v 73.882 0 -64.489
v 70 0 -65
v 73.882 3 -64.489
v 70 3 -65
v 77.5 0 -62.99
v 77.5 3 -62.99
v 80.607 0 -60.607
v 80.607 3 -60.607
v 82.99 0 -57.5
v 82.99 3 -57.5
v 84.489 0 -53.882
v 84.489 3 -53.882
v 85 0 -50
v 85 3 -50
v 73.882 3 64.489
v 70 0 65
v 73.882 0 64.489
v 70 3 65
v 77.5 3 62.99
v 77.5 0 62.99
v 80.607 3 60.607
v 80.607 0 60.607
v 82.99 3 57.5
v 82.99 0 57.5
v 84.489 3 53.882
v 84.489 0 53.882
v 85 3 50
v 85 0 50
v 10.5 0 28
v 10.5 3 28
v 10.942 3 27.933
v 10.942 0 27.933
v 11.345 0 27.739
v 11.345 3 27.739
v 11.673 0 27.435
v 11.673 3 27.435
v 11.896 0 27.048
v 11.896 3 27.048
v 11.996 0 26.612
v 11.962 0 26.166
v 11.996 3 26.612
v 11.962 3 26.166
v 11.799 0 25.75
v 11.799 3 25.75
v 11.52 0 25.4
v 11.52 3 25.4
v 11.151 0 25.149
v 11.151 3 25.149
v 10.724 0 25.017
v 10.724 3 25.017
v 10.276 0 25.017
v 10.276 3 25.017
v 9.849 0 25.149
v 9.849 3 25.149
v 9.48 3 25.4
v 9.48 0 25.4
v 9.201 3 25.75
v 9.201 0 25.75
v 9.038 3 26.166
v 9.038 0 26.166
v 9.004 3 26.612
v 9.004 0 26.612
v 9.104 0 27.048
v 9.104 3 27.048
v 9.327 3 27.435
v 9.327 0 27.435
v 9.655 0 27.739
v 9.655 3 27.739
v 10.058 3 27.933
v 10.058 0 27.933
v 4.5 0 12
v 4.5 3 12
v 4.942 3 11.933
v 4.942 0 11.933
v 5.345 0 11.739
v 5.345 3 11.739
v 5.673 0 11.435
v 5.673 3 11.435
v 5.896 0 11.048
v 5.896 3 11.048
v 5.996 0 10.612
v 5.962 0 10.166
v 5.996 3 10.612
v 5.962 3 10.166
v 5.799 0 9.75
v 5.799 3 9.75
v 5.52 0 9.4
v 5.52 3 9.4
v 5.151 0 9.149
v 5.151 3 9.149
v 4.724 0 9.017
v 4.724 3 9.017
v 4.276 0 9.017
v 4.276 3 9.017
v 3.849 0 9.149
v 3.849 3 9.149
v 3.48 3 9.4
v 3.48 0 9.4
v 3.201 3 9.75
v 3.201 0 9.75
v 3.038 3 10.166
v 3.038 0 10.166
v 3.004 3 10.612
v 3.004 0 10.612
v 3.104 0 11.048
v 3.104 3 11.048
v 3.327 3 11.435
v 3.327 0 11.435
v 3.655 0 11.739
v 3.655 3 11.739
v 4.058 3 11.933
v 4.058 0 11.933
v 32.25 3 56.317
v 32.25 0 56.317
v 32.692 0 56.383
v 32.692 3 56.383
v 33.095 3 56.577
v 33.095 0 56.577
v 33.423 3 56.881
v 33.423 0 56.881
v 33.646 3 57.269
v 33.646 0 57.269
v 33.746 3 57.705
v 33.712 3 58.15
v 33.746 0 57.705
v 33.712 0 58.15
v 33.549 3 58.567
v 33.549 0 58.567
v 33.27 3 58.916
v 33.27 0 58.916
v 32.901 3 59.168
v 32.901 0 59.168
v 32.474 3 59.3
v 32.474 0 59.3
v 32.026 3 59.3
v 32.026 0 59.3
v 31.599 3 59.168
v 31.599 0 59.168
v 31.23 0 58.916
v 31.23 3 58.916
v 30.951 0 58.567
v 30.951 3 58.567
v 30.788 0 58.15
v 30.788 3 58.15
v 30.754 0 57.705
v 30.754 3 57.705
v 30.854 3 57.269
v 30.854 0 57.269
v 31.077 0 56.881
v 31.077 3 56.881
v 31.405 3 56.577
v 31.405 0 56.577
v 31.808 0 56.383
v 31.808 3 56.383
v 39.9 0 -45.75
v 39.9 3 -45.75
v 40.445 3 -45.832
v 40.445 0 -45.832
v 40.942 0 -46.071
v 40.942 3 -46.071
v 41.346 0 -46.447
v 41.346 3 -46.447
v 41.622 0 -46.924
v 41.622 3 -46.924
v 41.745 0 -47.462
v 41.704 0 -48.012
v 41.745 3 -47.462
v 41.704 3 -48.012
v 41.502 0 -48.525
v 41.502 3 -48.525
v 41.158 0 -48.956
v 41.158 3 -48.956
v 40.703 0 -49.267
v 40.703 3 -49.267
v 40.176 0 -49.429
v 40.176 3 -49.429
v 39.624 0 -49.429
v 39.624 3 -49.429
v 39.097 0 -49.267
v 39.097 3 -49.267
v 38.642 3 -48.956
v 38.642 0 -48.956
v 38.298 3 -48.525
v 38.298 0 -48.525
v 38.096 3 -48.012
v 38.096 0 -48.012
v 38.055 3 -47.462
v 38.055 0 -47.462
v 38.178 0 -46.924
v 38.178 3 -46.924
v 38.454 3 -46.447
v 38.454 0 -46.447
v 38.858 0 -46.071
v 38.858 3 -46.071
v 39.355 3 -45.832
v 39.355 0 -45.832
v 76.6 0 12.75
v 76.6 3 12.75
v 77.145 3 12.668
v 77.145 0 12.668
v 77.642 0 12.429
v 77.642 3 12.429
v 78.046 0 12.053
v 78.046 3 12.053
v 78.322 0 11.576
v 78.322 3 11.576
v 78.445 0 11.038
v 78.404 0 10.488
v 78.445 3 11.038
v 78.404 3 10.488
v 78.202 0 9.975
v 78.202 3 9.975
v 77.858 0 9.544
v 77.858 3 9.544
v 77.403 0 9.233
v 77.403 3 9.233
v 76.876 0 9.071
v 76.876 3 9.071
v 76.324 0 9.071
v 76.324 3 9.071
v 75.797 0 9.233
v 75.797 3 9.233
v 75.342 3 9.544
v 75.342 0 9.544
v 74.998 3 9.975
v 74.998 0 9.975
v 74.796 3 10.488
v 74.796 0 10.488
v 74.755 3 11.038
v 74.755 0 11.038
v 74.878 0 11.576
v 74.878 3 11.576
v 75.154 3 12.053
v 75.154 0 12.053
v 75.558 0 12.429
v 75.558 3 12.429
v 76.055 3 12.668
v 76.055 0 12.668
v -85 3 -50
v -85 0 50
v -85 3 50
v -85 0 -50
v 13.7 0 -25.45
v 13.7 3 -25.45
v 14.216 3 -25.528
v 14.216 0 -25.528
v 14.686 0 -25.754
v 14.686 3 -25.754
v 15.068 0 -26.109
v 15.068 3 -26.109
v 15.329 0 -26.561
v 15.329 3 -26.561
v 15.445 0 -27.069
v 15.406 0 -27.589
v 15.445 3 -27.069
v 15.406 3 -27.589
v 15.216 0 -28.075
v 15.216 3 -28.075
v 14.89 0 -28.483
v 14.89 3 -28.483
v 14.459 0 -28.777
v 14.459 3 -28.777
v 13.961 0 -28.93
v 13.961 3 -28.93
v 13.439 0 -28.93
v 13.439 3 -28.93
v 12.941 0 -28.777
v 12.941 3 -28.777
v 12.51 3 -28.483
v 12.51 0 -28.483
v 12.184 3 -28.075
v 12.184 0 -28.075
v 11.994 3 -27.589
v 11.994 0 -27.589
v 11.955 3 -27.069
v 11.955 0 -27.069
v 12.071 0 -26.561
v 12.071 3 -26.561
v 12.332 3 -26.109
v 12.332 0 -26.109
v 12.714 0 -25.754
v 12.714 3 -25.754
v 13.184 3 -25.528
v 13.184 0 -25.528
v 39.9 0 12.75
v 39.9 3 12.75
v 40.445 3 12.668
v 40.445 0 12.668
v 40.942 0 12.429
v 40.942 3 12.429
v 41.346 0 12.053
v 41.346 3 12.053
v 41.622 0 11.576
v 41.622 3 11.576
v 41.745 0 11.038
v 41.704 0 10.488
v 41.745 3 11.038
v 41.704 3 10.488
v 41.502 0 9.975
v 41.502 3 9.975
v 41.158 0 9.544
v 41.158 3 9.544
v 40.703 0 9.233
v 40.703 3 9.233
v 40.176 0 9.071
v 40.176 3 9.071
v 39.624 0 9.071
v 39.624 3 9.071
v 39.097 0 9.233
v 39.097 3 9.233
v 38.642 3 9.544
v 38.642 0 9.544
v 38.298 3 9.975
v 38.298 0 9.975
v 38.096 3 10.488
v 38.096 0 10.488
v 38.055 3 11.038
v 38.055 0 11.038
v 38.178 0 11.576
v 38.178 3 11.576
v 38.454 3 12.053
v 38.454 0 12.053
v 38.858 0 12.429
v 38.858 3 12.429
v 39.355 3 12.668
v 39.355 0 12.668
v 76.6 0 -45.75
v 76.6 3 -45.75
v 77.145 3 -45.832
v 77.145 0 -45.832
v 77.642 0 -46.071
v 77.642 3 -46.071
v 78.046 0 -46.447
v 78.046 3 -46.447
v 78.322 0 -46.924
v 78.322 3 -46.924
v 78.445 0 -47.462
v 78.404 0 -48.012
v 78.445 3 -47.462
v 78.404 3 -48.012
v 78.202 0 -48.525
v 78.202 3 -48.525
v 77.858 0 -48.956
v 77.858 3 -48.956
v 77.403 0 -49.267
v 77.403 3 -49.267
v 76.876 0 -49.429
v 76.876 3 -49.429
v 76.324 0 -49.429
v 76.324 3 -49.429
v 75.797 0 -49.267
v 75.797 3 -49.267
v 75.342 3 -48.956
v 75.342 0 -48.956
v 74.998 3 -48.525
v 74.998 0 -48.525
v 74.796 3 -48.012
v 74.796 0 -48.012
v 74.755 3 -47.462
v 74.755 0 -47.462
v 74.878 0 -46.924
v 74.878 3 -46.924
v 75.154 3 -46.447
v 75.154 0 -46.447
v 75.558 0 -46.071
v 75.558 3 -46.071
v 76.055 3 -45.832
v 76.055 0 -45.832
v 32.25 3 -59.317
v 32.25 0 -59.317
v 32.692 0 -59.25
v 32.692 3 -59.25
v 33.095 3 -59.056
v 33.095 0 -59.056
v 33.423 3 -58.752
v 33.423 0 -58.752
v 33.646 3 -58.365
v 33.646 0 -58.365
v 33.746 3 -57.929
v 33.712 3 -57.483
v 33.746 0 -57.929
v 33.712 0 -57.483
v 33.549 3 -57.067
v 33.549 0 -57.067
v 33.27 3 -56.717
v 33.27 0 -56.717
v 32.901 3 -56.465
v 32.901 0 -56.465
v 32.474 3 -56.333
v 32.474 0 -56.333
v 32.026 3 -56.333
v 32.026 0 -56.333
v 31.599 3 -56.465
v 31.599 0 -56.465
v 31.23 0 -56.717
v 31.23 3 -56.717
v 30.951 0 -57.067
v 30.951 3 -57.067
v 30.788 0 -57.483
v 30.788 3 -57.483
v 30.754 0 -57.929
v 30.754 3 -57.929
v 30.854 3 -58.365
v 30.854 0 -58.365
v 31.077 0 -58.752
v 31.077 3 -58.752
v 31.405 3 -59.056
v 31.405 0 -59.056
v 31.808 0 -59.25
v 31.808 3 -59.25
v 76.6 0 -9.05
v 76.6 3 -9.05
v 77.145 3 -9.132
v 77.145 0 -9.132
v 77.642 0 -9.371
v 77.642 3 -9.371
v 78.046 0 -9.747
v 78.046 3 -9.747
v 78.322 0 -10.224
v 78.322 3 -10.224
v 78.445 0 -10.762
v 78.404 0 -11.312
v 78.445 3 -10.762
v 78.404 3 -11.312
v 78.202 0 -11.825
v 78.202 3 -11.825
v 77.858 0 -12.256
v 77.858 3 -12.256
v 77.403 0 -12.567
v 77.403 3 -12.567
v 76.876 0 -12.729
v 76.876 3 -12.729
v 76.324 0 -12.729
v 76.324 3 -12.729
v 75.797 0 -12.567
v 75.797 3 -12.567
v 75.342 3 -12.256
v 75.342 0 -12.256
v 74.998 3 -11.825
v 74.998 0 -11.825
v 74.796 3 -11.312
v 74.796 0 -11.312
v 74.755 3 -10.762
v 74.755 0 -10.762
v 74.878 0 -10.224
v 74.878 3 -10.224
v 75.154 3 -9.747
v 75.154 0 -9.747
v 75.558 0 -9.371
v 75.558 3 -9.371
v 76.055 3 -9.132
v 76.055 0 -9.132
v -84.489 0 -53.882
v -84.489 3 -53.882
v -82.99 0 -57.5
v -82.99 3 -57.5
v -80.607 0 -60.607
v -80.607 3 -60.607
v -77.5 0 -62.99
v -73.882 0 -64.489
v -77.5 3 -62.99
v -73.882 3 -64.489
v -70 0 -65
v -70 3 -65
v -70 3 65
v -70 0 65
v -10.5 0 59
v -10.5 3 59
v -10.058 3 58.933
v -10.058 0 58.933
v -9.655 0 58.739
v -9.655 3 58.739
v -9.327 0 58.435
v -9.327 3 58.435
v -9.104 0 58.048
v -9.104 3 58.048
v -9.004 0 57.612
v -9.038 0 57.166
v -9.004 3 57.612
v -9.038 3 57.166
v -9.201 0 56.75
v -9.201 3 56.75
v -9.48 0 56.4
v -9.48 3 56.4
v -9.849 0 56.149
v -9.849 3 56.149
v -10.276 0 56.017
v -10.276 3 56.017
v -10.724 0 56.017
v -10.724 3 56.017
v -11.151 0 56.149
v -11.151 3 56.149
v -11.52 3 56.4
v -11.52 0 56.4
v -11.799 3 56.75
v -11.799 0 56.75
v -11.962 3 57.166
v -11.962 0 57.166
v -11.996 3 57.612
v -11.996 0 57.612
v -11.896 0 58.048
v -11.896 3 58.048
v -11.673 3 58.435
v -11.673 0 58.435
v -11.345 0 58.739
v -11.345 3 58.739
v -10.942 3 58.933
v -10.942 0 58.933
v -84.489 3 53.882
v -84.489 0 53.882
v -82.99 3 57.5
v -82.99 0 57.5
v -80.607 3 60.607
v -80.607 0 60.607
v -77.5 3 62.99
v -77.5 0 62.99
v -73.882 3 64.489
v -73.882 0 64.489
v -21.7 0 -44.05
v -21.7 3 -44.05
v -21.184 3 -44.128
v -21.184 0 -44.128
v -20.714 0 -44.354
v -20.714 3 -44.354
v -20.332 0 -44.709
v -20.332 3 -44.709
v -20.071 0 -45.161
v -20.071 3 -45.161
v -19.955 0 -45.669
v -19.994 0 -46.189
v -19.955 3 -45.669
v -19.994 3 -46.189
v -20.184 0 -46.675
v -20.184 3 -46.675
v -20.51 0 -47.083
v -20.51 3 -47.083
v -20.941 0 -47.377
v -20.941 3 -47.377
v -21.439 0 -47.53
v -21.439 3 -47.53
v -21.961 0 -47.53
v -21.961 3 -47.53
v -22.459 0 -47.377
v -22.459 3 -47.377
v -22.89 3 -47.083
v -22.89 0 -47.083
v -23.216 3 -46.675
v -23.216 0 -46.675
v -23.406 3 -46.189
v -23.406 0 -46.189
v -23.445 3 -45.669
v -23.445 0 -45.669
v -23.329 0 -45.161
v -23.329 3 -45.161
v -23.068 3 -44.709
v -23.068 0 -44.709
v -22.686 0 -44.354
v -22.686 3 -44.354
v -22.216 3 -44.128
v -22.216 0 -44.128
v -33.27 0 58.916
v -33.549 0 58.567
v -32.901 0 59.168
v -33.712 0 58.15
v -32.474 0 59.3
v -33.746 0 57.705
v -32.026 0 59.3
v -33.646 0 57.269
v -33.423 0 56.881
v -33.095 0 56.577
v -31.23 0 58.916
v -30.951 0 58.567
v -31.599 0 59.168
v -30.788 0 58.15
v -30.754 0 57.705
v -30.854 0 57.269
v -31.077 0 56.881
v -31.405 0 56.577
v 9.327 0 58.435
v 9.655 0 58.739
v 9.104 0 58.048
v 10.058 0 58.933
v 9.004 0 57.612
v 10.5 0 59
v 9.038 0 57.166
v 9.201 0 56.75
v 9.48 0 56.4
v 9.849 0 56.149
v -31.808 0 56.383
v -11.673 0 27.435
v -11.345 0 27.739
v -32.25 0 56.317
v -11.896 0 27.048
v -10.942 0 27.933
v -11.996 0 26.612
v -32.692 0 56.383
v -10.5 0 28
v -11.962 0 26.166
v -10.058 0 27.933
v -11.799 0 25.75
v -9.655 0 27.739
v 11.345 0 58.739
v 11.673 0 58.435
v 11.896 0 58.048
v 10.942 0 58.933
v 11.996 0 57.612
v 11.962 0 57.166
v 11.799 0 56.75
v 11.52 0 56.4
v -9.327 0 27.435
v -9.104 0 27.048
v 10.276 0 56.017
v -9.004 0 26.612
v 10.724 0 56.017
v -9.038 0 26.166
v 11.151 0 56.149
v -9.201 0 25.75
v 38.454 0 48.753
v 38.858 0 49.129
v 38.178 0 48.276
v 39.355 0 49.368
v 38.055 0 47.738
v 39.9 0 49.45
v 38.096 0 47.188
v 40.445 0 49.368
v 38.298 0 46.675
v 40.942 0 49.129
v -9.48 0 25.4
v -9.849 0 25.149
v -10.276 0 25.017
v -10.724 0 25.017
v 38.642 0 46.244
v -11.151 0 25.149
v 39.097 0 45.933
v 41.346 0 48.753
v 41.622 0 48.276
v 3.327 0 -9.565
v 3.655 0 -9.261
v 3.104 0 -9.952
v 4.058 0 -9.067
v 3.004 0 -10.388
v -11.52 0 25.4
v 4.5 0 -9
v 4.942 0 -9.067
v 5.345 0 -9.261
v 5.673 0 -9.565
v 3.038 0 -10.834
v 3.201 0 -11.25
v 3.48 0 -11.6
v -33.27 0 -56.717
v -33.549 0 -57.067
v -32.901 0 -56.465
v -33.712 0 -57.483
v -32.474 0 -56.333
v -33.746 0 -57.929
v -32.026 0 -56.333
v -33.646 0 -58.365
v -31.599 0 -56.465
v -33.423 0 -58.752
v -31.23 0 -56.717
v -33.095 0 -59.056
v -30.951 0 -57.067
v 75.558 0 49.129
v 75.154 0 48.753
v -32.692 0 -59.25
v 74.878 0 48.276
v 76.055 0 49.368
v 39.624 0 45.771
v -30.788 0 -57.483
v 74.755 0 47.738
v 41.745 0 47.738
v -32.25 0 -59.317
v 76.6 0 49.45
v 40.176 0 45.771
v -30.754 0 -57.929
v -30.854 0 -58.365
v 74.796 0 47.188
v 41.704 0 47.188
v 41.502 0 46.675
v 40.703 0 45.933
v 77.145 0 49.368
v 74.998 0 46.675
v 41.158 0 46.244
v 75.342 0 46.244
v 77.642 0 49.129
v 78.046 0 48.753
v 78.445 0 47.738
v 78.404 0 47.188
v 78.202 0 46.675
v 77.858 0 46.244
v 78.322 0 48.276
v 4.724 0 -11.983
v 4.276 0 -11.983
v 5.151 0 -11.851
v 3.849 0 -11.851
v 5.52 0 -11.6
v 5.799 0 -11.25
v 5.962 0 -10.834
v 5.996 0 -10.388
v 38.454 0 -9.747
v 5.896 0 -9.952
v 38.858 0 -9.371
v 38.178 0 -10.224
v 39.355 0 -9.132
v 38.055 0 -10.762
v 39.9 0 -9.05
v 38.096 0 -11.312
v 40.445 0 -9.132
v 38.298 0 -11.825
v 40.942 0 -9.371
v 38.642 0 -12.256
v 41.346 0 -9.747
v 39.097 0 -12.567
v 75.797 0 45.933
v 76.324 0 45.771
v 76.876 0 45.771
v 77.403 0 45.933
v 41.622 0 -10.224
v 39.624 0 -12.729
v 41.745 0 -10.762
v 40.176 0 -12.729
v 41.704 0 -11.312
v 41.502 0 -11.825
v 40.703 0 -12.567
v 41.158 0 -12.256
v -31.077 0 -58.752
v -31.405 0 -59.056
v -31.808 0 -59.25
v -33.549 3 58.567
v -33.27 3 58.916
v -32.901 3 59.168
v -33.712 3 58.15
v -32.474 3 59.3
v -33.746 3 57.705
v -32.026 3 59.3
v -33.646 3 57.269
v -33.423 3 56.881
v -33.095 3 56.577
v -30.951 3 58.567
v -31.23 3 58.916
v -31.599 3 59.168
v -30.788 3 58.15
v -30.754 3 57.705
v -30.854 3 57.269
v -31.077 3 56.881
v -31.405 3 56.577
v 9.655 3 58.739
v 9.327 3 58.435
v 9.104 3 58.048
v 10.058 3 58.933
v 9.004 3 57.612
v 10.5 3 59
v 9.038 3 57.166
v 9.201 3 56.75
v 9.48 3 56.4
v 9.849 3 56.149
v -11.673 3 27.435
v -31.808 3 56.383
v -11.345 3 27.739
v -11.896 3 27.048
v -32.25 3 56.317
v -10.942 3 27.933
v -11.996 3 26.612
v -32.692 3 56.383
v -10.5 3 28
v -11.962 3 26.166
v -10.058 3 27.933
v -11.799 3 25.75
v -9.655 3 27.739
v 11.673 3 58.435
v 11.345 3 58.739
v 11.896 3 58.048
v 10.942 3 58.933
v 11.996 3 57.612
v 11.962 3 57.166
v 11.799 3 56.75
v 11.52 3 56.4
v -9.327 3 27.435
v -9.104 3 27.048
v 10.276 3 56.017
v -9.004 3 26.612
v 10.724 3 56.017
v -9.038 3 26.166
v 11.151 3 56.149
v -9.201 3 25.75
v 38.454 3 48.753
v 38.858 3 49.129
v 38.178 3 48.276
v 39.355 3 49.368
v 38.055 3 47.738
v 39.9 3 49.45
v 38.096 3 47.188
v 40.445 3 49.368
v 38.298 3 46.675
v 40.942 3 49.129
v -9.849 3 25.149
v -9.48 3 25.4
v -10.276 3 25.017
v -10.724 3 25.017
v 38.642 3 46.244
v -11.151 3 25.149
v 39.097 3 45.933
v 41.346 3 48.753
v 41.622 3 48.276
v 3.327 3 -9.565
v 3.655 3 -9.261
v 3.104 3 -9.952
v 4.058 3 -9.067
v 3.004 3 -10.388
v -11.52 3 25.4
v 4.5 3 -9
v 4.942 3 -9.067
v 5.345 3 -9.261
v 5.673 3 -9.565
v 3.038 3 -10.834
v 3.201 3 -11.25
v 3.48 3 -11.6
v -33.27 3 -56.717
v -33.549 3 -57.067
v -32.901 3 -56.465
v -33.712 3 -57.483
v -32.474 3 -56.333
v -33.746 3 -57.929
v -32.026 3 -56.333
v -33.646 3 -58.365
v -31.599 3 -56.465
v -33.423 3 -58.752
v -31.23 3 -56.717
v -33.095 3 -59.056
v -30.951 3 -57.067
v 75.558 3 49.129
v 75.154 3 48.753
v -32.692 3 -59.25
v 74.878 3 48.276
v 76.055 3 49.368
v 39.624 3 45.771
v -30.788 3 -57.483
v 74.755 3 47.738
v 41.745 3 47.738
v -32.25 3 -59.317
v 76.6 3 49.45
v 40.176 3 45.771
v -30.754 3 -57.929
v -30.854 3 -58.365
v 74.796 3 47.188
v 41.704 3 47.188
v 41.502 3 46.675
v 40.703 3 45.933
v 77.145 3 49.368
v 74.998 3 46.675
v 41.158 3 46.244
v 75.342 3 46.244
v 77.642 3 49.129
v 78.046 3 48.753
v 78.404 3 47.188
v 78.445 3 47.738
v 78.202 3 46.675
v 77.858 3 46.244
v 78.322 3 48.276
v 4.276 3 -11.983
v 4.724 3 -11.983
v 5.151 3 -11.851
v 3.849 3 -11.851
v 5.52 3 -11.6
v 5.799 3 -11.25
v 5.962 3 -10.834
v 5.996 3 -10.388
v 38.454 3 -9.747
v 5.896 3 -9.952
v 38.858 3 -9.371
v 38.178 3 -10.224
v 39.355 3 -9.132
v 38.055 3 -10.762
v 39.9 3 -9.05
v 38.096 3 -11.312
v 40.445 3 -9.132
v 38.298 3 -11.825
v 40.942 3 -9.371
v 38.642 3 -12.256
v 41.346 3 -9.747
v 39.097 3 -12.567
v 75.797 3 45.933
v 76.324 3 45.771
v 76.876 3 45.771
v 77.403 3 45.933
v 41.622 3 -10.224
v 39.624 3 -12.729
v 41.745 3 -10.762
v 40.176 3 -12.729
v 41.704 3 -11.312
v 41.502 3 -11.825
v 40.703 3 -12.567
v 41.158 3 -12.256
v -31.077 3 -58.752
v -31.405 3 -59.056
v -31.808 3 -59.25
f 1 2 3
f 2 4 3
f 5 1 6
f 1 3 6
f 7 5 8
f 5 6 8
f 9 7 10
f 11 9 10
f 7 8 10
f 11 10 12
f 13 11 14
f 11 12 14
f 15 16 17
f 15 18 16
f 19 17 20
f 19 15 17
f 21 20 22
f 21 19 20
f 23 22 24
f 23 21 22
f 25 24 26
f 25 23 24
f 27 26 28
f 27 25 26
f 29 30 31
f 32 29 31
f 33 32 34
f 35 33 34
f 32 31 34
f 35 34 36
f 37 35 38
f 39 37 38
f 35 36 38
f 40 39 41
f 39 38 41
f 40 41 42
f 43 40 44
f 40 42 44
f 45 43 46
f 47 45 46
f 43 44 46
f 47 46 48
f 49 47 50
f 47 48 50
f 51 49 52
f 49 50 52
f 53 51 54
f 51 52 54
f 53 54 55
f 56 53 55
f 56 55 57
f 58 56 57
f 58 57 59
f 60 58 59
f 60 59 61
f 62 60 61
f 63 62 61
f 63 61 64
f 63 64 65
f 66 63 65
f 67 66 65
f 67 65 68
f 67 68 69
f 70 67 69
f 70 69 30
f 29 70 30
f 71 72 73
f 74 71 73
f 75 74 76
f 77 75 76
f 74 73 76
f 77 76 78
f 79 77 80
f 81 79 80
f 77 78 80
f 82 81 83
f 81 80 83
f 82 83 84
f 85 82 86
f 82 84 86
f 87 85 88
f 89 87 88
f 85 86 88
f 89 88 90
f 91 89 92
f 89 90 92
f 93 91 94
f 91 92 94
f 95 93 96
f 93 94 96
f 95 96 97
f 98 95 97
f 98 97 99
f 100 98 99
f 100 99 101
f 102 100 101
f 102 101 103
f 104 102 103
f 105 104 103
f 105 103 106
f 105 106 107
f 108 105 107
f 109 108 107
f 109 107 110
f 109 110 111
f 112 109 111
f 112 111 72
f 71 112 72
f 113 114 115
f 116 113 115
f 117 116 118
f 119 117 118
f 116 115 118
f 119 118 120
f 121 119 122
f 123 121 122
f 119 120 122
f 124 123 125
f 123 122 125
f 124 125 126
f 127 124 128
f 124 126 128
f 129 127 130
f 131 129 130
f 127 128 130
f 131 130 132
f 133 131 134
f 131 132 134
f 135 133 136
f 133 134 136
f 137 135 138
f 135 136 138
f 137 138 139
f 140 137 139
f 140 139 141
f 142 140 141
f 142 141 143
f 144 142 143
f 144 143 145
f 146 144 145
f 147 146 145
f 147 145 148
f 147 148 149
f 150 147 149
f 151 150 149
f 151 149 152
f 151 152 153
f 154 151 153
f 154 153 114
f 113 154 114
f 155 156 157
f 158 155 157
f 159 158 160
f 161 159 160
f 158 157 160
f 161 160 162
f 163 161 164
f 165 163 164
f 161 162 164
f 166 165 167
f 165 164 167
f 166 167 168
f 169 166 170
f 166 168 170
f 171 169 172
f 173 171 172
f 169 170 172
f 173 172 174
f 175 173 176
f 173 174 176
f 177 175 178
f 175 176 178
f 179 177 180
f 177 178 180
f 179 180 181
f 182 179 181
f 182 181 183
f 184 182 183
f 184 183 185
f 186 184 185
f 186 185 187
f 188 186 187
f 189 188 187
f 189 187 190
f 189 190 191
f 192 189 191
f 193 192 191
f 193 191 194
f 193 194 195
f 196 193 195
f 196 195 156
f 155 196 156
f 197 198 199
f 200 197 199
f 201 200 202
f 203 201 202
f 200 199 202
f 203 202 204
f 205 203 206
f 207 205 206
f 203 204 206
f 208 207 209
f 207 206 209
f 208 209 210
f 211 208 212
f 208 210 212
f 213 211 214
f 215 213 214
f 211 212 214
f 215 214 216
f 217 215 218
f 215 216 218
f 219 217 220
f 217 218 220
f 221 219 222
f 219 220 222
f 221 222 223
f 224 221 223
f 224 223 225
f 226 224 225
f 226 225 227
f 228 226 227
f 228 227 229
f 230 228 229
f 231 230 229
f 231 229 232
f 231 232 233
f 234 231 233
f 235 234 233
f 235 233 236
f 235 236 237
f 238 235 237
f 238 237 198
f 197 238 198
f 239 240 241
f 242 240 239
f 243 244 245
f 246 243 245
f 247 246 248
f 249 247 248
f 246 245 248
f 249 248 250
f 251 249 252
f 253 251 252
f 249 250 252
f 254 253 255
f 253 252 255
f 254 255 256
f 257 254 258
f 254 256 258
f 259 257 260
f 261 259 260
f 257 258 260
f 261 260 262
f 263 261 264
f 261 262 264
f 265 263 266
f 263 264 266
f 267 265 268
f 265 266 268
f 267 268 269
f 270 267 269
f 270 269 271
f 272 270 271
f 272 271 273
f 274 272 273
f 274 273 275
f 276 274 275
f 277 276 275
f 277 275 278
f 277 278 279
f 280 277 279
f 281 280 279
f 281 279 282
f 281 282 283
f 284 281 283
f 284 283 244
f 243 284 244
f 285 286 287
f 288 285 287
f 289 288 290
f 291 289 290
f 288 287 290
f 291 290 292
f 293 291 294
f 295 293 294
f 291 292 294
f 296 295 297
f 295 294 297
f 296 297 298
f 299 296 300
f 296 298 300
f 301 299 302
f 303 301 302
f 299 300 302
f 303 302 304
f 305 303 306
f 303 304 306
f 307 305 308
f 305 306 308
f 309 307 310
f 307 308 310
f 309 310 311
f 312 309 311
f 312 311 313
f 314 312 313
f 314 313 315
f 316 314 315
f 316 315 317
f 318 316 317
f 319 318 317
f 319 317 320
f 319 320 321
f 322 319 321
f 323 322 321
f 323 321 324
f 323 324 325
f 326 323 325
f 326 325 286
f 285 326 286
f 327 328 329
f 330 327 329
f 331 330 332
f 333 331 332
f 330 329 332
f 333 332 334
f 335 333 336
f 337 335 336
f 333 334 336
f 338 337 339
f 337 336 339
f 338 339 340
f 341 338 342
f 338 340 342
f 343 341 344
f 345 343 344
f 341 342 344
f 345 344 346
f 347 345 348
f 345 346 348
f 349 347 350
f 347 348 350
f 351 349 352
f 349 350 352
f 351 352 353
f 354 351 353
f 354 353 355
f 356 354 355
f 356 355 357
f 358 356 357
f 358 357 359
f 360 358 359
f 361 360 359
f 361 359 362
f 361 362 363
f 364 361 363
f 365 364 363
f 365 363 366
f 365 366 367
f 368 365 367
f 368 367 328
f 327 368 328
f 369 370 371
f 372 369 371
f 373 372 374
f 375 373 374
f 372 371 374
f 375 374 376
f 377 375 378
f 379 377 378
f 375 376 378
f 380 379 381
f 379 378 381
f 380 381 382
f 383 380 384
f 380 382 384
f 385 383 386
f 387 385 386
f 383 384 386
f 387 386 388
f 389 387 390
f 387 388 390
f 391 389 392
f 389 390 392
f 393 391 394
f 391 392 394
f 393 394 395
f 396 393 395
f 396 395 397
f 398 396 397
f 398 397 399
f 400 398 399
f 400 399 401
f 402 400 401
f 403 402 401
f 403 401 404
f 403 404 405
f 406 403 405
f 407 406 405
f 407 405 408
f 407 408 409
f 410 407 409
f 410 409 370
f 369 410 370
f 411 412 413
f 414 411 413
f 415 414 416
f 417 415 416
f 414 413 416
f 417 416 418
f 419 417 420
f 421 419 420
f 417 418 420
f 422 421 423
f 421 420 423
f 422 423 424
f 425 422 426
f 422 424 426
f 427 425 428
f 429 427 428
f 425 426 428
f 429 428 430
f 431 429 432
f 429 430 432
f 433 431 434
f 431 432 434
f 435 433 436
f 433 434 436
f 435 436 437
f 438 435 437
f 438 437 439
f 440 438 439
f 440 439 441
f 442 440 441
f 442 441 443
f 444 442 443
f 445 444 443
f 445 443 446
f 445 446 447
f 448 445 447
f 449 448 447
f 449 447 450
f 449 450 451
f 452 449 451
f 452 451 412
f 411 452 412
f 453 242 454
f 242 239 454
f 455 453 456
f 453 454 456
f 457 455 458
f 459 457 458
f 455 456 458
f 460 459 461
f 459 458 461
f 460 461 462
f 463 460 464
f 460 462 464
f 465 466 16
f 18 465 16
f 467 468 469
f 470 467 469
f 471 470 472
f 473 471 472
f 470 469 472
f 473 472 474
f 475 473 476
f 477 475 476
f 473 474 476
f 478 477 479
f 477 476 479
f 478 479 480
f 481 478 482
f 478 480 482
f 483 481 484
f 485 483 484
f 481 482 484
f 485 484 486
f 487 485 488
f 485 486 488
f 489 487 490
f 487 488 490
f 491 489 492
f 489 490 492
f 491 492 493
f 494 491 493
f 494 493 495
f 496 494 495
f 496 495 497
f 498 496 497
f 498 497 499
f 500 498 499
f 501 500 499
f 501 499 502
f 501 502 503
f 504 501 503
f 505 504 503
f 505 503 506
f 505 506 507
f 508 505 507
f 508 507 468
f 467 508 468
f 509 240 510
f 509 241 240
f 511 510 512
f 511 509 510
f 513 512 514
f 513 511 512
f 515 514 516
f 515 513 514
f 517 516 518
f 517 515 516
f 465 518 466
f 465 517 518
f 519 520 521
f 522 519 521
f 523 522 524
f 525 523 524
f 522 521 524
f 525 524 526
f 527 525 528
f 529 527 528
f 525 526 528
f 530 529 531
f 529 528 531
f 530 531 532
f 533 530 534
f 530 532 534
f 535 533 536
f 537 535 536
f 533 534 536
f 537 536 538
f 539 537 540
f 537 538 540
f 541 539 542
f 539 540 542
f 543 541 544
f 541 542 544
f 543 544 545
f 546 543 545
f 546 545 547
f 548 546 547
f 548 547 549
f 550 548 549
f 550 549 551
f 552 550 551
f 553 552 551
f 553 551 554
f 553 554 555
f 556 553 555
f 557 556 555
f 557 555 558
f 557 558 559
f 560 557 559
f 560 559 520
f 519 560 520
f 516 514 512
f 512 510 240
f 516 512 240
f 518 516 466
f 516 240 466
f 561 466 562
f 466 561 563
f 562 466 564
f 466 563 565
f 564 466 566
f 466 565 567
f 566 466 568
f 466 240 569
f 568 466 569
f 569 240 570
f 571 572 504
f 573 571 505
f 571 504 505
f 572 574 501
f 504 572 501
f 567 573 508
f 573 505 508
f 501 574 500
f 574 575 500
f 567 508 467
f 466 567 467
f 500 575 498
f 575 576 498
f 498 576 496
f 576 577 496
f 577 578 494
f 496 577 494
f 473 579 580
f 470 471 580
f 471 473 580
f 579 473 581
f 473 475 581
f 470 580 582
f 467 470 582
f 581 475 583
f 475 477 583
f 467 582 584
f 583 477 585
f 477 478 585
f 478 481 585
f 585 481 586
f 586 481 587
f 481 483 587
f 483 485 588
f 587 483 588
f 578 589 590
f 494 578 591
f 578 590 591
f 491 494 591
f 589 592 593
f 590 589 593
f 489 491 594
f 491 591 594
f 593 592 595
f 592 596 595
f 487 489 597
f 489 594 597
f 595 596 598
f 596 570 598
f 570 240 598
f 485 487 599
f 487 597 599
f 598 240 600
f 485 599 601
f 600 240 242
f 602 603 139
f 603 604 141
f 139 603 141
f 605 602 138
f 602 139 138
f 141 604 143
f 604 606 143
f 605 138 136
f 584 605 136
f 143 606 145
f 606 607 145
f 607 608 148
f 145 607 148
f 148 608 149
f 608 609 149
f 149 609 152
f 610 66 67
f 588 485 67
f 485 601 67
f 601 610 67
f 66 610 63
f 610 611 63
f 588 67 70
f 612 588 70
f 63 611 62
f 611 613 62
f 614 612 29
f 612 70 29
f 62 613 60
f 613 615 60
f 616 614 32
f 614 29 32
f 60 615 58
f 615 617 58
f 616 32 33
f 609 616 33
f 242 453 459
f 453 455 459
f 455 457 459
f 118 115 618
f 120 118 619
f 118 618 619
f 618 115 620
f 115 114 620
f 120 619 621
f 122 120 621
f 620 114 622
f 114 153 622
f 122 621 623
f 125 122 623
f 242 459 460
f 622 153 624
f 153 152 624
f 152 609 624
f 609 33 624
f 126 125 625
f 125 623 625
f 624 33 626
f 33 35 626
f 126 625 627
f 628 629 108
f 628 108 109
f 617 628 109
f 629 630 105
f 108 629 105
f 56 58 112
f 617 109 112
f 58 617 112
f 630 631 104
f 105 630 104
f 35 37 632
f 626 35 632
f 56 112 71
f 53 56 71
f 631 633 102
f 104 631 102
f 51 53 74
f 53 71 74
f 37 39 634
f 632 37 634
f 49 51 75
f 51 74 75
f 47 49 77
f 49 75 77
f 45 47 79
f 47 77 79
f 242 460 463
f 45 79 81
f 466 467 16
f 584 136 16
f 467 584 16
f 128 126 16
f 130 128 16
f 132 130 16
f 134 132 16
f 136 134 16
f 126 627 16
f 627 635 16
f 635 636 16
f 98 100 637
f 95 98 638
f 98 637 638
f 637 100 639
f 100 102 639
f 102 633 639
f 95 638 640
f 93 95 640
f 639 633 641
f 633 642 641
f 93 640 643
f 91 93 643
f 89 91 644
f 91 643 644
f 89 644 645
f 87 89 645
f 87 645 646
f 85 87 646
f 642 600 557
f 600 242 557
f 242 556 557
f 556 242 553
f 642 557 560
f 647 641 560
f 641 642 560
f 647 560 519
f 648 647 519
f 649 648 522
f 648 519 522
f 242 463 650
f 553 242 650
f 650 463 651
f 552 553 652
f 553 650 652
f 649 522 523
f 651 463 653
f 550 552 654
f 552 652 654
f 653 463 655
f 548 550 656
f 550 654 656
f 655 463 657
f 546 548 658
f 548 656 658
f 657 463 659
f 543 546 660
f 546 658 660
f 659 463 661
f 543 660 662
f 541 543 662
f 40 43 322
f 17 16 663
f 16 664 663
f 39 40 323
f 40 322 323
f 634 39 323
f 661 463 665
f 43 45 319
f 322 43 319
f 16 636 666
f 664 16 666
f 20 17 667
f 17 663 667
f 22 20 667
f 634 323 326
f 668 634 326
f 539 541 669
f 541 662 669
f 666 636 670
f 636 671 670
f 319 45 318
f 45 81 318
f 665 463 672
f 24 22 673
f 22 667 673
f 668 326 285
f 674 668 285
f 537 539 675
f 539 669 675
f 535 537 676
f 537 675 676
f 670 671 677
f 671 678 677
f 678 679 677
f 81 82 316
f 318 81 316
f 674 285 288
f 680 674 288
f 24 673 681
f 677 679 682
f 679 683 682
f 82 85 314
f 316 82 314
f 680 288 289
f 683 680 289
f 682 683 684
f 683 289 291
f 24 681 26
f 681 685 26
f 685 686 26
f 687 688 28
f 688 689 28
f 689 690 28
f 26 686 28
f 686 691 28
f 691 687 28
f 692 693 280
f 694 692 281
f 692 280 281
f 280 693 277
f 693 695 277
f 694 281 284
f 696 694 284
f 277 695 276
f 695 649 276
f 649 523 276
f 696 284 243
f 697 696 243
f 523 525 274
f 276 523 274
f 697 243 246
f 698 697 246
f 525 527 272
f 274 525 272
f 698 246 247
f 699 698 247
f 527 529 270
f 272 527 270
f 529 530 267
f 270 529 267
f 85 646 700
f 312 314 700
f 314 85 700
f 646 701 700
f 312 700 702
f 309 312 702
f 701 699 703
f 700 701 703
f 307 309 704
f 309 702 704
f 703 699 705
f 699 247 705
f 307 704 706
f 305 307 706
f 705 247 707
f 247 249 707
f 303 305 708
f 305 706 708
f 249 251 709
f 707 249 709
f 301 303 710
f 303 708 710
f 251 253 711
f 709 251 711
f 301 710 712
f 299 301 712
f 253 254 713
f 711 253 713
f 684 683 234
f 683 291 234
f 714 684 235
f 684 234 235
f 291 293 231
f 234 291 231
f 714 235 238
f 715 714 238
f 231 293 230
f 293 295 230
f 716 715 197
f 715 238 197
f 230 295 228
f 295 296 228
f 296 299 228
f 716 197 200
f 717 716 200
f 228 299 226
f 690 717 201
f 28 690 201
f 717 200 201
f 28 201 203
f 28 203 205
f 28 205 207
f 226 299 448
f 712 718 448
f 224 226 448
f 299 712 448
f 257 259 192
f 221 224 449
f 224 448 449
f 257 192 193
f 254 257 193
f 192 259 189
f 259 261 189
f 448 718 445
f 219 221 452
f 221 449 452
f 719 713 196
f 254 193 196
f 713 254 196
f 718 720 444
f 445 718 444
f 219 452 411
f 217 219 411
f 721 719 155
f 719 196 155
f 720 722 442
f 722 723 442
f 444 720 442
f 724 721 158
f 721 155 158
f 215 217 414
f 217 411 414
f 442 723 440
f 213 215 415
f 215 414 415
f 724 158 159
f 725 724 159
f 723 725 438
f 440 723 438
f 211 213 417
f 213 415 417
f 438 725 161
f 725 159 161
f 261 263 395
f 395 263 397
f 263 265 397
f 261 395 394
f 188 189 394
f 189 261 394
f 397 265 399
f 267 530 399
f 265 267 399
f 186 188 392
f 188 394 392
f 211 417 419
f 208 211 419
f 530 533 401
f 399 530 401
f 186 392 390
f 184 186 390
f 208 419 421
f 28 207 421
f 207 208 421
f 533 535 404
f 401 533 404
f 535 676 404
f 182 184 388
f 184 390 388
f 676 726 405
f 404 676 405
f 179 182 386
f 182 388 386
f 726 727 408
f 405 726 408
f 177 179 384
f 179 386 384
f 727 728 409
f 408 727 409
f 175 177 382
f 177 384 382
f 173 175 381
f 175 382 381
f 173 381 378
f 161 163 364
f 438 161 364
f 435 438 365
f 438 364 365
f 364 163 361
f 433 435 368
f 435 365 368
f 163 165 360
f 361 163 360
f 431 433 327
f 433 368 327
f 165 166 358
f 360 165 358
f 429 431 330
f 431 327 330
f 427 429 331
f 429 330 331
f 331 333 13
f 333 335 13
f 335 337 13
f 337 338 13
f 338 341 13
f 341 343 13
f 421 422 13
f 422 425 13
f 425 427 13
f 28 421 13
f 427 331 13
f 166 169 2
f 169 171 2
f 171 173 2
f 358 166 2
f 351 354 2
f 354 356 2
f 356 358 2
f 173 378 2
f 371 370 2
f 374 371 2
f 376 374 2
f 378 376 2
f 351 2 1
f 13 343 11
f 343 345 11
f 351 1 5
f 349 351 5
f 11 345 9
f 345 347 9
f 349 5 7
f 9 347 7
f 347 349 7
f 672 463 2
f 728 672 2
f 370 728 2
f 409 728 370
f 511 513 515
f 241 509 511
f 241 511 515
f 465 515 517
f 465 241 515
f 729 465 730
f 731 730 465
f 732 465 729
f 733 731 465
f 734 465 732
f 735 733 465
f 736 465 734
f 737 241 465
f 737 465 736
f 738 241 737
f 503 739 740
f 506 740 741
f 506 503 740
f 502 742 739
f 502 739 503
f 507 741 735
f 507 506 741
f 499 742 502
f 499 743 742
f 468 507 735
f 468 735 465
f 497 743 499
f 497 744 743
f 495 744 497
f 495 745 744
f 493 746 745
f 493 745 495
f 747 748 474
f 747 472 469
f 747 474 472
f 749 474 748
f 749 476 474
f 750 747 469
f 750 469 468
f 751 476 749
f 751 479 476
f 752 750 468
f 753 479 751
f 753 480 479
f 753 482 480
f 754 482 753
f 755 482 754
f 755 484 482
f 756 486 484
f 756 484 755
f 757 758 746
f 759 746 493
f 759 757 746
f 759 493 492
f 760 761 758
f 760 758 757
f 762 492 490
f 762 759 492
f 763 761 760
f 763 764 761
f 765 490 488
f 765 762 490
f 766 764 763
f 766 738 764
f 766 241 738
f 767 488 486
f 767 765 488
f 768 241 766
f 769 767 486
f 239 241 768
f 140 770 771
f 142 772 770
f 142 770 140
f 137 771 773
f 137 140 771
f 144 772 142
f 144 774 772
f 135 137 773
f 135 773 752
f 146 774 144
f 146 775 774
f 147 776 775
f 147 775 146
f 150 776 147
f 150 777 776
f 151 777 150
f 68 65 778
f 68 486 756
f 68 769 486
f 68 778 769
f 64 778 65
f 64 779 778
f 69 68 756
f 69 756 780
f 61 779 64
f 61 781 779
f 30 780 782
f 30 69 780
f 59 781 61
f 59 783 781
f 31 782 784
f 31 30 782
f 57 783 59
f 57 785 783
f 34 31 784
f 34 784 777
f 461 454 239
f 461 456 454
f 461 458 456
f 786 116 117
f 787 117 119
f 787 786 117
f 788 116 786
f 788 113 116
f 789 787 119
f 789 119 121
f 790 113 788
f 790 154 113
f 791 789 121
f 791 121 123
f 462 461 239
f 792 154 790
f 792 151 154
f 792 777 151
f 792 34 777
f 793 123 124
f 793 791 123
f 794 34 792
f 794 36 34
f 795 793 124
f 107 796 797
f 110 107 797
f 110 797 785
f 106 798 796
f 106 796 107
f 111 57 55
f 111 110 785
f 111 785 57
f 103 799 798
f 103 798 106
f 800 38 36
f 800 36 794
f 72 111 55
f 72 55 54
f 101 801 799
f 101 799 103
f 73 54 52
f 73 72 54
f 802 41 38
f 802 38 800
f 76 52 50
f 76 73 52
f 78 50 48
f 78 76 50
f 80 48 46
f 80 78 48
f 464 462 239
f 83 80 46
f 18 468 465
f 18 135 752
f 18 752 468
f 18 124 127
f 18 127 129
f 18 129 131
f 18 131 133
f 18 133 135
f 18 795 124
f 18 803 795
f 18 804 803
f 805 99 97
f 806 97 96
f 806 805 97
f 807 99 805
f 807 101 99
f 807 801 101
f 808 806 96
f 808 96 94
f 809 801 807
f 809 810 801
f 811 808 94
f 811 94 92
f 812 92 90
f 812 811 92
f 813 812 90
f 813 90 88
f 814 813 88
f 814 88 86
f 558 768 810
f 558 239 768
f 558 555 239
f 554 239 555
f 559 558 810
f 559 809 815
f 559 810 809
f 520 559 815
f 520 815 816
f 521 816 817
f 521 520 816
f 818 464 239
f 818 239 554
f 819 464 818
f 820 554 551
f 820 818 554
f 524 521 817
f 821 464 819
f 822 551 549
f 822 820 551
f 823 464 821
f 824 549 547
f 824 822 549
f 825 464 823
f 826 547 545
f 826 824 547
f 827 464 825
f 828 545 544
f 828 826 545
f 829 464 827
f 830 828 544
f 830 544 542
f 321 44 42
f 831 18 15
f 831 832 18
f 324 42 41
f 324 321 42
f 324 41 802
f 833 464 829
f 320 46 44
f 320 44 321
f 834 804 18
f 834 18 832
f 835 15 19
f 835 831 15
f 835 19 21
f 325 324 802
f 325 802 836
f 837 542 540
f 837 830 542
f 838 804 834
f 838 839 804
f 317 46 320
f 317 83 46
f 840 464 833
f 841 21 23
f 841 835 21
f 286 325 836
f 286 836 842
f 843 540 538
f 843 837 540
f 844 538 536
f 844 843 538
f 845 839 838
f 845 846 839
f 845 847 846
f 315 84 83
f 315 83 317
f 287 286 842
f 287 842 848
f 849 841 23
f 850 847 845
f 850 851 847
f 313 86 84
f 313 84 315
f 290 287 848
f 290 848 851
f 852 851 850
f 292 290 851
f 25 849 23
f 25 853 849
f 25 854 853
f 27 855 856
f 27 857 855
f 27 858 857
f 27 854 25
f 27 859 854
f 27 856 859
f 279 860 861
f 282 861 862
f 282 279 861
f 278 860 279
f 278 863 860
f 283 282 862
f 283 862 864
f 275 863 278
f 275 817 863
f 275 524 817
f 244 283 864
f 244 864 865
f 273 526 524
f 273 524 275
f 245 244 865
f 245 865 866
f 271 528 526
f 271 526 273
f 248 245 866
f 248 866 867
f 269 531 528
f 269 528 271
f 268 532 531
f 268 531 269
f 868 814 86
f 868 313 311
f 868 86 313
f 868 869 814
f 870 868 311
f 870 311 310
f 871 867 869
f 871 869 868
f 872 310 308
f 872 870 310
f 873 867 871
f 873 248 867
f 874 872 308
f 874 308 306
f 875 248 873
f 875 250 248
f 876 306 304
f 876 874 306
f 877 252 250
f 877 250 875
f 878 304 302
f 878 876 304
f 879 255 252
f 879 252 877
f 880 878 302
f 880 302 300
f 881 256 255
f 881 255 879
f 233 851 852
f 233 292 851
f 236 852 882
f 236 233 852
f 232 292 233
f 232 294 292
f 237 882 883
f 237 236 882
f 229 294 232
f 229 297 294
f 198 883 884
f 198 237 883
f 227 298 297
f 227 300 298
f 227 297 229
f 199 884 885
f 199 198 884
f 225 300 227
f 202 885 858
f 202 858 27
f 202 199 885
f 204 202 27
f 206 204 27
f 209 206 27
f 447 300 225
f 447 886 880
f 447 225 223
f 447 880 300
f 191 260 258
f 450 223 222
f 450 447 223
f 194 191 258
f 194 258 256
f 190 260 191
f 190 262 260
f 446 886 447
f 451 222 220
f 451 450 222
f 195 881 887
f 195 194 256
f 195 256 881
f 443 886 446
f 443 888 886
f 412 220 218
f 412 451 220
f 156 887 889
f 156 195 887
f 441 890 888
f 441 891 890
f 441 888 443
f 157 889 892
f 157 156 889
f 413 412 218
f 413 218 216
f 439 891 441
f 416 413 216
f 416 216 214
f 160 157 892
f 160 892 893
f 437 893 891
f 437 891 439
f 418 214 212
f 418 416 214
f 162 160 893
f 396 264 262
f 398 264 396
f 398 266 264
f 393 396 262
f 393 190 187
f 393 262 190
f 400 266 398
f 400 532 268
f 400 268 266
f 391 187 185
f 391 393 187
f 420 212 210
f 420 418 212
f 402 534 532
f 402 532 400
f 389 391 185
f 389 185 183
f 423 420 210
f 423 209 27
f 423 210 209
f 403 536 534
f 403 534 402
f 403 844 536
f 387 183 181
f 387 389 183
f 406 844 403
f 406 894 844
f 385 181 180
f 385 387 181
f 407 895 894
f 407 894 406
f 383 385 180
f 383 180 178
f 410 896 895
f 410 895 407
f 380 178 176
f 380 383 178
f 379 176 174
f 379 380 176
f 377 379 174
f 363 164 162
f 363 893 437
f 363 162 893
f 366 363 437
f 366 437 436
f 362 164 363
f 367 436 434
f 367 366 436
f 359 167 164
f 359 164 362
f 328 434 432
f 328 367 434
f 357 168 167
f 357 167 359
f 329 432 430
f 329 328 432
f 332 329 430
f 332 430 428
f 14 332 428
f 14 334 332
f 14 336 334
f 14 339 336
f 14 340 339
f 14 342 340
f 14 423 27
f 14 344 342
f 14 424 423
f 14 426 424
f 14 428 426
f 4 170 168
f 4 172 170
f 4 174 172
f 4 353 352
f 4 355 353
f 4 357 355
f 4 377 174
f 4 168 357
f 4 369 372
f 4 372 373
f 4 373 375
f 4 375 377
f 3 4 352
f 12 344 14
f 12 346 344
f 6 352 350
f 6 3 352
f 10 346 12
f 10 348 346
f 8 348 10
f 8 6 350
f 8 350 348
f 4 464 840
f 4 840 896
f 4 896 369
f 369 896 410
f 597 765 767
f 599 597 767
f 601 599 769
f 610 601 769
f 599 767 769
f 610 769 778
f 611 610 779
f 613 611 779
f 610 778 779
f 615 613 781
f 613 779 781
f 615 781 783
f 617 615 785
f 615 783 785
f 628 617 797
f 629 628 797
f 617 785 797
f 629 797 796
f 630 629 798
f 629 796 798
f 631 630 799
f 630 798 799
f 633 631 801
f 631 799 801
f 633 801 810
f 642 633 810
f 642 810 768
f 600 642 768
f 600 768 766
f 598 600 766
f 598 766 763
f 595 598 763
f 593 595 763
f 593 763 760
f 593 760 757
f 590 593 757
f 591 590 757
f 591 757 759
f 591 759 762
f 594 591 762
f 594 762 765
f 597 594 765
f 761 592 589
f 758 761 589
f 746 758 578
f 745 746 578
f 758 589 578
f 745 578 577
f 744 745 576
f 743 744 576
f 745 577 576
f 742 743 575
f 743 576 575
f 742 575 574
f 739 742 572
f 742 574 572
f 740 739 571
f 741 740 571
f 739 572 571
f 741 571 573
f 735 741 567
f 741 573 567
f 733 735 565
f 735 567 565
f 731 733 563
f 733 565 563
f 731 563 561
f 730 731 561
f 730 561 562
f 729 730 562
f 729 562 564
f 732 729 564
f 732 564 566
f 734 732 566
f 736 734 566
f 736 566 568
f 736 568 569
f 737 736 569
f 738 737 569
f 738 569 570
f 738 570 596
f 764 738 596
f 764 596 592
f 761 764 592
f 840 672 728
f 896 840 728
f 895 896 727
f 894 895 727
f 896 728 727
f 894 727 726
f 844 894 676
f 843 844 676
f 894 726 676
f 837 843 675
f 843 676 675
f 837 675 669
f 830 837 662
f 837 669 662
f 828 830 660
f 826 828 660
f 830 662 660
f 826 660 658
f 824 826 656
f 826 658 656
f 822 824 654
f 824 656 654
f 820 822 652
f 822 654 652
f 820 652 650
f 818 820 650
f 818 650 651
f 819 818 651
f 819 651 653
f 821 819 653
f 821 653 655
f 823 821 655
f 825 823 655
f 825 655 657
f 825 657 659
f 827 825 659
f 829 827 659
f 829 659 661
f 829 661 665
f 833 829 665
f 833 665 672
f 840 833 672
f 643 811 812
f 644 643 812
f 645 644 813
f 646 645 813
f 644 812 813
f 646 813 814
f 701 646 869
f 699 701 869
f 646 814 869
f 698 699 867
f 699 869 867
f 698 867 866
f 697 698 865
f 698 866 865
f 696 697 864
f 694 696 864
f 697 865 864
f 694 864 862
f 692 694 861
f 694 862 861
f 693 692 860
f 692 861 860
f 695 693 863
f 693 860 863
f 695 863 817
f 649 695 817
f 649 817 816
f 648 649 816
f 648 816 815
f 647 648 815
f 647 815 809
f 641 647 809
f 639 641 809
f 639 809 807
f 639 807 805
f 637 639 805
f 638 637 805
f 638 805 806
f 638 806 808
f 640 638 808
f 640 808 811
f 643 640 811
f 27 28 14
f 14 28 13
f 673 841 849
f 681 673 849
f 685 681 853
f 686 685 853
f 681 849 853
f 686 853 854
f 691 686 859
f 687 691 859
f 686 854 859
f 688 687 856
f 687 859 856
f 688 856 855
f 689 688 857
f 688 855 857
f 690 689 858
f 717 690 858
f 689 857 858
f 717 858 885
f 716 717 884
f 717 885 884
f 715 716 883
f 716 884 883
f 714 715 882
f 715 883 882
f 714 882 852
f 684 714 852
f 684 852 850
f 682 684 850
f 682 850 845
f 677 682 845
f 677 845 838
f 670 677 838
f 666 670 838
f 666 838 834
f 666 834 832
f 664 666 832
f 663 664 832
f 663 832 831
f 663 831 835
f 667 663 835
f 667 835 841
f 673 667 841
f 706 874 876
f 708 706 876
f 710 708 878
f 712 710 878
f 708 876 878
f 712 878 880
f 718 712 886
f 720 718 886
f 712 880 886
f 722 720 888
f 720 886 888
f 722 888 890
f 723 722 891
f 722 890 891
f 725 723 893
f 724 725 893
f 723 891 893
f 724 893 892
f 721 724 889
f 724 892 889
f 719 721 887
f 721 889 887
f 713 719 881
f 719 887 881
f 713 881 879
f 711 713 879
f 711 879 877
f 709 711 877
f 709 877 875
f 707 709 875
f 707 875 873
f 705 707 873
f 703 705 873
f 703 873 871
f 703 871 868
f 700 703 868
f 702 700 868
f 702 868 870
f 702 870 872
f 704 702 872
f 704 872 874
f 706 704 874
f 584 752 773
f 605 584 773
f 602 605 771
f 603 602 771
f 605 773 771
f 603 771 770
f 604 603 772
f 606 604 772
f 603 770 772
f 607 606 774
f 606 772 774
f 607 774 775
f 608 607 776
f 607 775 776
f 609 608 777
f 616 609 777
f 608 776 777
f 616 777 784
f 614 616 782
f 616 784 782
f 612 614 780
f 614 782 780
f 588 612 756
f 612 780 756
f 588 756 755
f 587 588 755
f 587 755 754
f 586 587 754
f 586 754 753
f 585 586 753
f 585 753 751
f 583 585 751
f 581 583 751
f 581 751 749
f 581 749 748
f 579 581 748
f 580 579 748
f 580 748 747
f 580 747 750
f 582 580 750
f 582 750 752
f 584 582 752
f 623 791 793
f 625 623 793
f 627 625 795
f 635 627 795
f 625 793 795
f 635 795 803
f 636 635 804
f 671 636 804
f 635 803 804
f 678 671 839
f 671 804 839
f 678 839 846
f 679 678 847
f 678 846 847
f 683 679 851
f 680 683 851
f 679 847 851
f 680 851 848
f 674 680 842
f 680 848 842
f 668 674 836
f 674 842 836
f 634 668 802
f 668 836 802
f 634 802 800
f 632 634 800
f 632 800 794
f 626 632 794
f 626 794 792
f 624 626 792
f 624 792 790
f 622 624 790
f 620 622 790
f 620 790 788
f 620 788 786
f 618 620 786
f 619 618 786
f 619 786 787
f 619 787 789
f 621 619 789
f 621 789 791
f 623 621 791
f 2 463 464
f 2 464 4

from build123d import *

# Parameters (mm, degrees)
SKETCH2_W           = 170
SKETCH2_H           = 130
BOSS_EXTRUDE1_DEPTH = 3
SKETCH3_R           = 1.5
CUT_EXTRUDE1_DEPTH  = 108.046718773
SKETCH4_R           = 1.75
SKETCH4_R_2         = 1.5
SKETCH4_R_3         = 1.85
CUT_EXTRUDE2_DEPTH  = 108.046718773
FILLET1_R           = 15


with BuildPart() as part:
    # Sketch2 → Boss-Extrude1 (new body)
    with BuildSketch(Plane(origin=(0, 0, 0), x_dir=(1, 0, 0), z_dir=(0, 1, 0))):
        Rectangle(SKETCH2_W, SKETCH2_H)
    extrude(amount=BOSS_EXTRUDE1_DEPTH)

    # Sketch3 → Cut-Extrude1 (cut, through all)
    with BuildSketch(Plane.XZ):
        with Locations((32.25, 57.816706978)):
            Circle(SKETCH3_R)
        with Locations((-32.25, -57.816706978)):
            Circle(SKETCH3_R)
        with Locations((-32.25, 57.816706978)):
            Circle(SKETCH3_R)
        with Locations((32.25, -57.816706978)):
            Circle(SKETCH3_R)
    extrude(amount=-CUT_EXTRUDE1_DEPTH, mode=Mode.SUBTRACT)

    # Sketch4 → Cut-Extrude2 (cut, through all)
    with BuildSketch(Plane(origin=(0, 3, 0), x_dir=(1, 0, 0), z_dir=(0, 1, 0))):
        with Locations((13.7, 27.2)):
            Circle(SKETCH4_R)
        with Locations((-21.7, 45.8)):
            Circle(SKETCH4_R)
        with Locations((-10.5, -26.5)):
            Circle(SKETCH4_R_2)
        with Locations((10.5, -26.5)):
            Circle(SKETCH4_R_2)
        with Locations((10.5, -57.5)):
            Circle(SKETCH4_R_2)
        with Locations((-10.5, -57.5)):
            Circle(SKETCH4_R_2)
        with Locations((76.6, -10.9)):
            Circle(SKETCH4_R_3)
        with Locations((76.6, -47.6)):
            Circle(SKETCH4_R_3)
        with Locations((39.9, -47.6)):
            Circle(SKETCH4_R_3)
        with Locations((39.9, -10.9)):
            Circle(SKETCH4_R_3)
        with Locations((39.9, 47.6)):
            Circle(SKETCH4_R_3)
        with Locations((76.6, 47.6)):
            Circle(SKETCH4_R_3)
        with Locations((76.6, 10.9)):
            Circle(SKETCH4_R_3)
        with Locations((39.9, 10.9)):
            Circle(SKETCH4_R_3)
        with Locations((4.5, -10.5)):
            Circle(SKETCH4_R_2)
        with Locations((4.5, 10.5)):
            Circle(SKETCH4_R_2)
    extrude(amount=-CUT_EXTRUDE2_DEPTH, mode=Mode.SUBTRACT)

    # Fillet1
    fillet1_edges = [part.edges().sort_by_distance(p)[0] for p in [
        (-85, 1.5, 65),
        (85, 1.5, 65),
        (85, 1.5, -65),
        (-85, 1.5, -65),
    ]]
    fillet(fillet1_edges, radius=FILLET1_R)


solid = part.part
